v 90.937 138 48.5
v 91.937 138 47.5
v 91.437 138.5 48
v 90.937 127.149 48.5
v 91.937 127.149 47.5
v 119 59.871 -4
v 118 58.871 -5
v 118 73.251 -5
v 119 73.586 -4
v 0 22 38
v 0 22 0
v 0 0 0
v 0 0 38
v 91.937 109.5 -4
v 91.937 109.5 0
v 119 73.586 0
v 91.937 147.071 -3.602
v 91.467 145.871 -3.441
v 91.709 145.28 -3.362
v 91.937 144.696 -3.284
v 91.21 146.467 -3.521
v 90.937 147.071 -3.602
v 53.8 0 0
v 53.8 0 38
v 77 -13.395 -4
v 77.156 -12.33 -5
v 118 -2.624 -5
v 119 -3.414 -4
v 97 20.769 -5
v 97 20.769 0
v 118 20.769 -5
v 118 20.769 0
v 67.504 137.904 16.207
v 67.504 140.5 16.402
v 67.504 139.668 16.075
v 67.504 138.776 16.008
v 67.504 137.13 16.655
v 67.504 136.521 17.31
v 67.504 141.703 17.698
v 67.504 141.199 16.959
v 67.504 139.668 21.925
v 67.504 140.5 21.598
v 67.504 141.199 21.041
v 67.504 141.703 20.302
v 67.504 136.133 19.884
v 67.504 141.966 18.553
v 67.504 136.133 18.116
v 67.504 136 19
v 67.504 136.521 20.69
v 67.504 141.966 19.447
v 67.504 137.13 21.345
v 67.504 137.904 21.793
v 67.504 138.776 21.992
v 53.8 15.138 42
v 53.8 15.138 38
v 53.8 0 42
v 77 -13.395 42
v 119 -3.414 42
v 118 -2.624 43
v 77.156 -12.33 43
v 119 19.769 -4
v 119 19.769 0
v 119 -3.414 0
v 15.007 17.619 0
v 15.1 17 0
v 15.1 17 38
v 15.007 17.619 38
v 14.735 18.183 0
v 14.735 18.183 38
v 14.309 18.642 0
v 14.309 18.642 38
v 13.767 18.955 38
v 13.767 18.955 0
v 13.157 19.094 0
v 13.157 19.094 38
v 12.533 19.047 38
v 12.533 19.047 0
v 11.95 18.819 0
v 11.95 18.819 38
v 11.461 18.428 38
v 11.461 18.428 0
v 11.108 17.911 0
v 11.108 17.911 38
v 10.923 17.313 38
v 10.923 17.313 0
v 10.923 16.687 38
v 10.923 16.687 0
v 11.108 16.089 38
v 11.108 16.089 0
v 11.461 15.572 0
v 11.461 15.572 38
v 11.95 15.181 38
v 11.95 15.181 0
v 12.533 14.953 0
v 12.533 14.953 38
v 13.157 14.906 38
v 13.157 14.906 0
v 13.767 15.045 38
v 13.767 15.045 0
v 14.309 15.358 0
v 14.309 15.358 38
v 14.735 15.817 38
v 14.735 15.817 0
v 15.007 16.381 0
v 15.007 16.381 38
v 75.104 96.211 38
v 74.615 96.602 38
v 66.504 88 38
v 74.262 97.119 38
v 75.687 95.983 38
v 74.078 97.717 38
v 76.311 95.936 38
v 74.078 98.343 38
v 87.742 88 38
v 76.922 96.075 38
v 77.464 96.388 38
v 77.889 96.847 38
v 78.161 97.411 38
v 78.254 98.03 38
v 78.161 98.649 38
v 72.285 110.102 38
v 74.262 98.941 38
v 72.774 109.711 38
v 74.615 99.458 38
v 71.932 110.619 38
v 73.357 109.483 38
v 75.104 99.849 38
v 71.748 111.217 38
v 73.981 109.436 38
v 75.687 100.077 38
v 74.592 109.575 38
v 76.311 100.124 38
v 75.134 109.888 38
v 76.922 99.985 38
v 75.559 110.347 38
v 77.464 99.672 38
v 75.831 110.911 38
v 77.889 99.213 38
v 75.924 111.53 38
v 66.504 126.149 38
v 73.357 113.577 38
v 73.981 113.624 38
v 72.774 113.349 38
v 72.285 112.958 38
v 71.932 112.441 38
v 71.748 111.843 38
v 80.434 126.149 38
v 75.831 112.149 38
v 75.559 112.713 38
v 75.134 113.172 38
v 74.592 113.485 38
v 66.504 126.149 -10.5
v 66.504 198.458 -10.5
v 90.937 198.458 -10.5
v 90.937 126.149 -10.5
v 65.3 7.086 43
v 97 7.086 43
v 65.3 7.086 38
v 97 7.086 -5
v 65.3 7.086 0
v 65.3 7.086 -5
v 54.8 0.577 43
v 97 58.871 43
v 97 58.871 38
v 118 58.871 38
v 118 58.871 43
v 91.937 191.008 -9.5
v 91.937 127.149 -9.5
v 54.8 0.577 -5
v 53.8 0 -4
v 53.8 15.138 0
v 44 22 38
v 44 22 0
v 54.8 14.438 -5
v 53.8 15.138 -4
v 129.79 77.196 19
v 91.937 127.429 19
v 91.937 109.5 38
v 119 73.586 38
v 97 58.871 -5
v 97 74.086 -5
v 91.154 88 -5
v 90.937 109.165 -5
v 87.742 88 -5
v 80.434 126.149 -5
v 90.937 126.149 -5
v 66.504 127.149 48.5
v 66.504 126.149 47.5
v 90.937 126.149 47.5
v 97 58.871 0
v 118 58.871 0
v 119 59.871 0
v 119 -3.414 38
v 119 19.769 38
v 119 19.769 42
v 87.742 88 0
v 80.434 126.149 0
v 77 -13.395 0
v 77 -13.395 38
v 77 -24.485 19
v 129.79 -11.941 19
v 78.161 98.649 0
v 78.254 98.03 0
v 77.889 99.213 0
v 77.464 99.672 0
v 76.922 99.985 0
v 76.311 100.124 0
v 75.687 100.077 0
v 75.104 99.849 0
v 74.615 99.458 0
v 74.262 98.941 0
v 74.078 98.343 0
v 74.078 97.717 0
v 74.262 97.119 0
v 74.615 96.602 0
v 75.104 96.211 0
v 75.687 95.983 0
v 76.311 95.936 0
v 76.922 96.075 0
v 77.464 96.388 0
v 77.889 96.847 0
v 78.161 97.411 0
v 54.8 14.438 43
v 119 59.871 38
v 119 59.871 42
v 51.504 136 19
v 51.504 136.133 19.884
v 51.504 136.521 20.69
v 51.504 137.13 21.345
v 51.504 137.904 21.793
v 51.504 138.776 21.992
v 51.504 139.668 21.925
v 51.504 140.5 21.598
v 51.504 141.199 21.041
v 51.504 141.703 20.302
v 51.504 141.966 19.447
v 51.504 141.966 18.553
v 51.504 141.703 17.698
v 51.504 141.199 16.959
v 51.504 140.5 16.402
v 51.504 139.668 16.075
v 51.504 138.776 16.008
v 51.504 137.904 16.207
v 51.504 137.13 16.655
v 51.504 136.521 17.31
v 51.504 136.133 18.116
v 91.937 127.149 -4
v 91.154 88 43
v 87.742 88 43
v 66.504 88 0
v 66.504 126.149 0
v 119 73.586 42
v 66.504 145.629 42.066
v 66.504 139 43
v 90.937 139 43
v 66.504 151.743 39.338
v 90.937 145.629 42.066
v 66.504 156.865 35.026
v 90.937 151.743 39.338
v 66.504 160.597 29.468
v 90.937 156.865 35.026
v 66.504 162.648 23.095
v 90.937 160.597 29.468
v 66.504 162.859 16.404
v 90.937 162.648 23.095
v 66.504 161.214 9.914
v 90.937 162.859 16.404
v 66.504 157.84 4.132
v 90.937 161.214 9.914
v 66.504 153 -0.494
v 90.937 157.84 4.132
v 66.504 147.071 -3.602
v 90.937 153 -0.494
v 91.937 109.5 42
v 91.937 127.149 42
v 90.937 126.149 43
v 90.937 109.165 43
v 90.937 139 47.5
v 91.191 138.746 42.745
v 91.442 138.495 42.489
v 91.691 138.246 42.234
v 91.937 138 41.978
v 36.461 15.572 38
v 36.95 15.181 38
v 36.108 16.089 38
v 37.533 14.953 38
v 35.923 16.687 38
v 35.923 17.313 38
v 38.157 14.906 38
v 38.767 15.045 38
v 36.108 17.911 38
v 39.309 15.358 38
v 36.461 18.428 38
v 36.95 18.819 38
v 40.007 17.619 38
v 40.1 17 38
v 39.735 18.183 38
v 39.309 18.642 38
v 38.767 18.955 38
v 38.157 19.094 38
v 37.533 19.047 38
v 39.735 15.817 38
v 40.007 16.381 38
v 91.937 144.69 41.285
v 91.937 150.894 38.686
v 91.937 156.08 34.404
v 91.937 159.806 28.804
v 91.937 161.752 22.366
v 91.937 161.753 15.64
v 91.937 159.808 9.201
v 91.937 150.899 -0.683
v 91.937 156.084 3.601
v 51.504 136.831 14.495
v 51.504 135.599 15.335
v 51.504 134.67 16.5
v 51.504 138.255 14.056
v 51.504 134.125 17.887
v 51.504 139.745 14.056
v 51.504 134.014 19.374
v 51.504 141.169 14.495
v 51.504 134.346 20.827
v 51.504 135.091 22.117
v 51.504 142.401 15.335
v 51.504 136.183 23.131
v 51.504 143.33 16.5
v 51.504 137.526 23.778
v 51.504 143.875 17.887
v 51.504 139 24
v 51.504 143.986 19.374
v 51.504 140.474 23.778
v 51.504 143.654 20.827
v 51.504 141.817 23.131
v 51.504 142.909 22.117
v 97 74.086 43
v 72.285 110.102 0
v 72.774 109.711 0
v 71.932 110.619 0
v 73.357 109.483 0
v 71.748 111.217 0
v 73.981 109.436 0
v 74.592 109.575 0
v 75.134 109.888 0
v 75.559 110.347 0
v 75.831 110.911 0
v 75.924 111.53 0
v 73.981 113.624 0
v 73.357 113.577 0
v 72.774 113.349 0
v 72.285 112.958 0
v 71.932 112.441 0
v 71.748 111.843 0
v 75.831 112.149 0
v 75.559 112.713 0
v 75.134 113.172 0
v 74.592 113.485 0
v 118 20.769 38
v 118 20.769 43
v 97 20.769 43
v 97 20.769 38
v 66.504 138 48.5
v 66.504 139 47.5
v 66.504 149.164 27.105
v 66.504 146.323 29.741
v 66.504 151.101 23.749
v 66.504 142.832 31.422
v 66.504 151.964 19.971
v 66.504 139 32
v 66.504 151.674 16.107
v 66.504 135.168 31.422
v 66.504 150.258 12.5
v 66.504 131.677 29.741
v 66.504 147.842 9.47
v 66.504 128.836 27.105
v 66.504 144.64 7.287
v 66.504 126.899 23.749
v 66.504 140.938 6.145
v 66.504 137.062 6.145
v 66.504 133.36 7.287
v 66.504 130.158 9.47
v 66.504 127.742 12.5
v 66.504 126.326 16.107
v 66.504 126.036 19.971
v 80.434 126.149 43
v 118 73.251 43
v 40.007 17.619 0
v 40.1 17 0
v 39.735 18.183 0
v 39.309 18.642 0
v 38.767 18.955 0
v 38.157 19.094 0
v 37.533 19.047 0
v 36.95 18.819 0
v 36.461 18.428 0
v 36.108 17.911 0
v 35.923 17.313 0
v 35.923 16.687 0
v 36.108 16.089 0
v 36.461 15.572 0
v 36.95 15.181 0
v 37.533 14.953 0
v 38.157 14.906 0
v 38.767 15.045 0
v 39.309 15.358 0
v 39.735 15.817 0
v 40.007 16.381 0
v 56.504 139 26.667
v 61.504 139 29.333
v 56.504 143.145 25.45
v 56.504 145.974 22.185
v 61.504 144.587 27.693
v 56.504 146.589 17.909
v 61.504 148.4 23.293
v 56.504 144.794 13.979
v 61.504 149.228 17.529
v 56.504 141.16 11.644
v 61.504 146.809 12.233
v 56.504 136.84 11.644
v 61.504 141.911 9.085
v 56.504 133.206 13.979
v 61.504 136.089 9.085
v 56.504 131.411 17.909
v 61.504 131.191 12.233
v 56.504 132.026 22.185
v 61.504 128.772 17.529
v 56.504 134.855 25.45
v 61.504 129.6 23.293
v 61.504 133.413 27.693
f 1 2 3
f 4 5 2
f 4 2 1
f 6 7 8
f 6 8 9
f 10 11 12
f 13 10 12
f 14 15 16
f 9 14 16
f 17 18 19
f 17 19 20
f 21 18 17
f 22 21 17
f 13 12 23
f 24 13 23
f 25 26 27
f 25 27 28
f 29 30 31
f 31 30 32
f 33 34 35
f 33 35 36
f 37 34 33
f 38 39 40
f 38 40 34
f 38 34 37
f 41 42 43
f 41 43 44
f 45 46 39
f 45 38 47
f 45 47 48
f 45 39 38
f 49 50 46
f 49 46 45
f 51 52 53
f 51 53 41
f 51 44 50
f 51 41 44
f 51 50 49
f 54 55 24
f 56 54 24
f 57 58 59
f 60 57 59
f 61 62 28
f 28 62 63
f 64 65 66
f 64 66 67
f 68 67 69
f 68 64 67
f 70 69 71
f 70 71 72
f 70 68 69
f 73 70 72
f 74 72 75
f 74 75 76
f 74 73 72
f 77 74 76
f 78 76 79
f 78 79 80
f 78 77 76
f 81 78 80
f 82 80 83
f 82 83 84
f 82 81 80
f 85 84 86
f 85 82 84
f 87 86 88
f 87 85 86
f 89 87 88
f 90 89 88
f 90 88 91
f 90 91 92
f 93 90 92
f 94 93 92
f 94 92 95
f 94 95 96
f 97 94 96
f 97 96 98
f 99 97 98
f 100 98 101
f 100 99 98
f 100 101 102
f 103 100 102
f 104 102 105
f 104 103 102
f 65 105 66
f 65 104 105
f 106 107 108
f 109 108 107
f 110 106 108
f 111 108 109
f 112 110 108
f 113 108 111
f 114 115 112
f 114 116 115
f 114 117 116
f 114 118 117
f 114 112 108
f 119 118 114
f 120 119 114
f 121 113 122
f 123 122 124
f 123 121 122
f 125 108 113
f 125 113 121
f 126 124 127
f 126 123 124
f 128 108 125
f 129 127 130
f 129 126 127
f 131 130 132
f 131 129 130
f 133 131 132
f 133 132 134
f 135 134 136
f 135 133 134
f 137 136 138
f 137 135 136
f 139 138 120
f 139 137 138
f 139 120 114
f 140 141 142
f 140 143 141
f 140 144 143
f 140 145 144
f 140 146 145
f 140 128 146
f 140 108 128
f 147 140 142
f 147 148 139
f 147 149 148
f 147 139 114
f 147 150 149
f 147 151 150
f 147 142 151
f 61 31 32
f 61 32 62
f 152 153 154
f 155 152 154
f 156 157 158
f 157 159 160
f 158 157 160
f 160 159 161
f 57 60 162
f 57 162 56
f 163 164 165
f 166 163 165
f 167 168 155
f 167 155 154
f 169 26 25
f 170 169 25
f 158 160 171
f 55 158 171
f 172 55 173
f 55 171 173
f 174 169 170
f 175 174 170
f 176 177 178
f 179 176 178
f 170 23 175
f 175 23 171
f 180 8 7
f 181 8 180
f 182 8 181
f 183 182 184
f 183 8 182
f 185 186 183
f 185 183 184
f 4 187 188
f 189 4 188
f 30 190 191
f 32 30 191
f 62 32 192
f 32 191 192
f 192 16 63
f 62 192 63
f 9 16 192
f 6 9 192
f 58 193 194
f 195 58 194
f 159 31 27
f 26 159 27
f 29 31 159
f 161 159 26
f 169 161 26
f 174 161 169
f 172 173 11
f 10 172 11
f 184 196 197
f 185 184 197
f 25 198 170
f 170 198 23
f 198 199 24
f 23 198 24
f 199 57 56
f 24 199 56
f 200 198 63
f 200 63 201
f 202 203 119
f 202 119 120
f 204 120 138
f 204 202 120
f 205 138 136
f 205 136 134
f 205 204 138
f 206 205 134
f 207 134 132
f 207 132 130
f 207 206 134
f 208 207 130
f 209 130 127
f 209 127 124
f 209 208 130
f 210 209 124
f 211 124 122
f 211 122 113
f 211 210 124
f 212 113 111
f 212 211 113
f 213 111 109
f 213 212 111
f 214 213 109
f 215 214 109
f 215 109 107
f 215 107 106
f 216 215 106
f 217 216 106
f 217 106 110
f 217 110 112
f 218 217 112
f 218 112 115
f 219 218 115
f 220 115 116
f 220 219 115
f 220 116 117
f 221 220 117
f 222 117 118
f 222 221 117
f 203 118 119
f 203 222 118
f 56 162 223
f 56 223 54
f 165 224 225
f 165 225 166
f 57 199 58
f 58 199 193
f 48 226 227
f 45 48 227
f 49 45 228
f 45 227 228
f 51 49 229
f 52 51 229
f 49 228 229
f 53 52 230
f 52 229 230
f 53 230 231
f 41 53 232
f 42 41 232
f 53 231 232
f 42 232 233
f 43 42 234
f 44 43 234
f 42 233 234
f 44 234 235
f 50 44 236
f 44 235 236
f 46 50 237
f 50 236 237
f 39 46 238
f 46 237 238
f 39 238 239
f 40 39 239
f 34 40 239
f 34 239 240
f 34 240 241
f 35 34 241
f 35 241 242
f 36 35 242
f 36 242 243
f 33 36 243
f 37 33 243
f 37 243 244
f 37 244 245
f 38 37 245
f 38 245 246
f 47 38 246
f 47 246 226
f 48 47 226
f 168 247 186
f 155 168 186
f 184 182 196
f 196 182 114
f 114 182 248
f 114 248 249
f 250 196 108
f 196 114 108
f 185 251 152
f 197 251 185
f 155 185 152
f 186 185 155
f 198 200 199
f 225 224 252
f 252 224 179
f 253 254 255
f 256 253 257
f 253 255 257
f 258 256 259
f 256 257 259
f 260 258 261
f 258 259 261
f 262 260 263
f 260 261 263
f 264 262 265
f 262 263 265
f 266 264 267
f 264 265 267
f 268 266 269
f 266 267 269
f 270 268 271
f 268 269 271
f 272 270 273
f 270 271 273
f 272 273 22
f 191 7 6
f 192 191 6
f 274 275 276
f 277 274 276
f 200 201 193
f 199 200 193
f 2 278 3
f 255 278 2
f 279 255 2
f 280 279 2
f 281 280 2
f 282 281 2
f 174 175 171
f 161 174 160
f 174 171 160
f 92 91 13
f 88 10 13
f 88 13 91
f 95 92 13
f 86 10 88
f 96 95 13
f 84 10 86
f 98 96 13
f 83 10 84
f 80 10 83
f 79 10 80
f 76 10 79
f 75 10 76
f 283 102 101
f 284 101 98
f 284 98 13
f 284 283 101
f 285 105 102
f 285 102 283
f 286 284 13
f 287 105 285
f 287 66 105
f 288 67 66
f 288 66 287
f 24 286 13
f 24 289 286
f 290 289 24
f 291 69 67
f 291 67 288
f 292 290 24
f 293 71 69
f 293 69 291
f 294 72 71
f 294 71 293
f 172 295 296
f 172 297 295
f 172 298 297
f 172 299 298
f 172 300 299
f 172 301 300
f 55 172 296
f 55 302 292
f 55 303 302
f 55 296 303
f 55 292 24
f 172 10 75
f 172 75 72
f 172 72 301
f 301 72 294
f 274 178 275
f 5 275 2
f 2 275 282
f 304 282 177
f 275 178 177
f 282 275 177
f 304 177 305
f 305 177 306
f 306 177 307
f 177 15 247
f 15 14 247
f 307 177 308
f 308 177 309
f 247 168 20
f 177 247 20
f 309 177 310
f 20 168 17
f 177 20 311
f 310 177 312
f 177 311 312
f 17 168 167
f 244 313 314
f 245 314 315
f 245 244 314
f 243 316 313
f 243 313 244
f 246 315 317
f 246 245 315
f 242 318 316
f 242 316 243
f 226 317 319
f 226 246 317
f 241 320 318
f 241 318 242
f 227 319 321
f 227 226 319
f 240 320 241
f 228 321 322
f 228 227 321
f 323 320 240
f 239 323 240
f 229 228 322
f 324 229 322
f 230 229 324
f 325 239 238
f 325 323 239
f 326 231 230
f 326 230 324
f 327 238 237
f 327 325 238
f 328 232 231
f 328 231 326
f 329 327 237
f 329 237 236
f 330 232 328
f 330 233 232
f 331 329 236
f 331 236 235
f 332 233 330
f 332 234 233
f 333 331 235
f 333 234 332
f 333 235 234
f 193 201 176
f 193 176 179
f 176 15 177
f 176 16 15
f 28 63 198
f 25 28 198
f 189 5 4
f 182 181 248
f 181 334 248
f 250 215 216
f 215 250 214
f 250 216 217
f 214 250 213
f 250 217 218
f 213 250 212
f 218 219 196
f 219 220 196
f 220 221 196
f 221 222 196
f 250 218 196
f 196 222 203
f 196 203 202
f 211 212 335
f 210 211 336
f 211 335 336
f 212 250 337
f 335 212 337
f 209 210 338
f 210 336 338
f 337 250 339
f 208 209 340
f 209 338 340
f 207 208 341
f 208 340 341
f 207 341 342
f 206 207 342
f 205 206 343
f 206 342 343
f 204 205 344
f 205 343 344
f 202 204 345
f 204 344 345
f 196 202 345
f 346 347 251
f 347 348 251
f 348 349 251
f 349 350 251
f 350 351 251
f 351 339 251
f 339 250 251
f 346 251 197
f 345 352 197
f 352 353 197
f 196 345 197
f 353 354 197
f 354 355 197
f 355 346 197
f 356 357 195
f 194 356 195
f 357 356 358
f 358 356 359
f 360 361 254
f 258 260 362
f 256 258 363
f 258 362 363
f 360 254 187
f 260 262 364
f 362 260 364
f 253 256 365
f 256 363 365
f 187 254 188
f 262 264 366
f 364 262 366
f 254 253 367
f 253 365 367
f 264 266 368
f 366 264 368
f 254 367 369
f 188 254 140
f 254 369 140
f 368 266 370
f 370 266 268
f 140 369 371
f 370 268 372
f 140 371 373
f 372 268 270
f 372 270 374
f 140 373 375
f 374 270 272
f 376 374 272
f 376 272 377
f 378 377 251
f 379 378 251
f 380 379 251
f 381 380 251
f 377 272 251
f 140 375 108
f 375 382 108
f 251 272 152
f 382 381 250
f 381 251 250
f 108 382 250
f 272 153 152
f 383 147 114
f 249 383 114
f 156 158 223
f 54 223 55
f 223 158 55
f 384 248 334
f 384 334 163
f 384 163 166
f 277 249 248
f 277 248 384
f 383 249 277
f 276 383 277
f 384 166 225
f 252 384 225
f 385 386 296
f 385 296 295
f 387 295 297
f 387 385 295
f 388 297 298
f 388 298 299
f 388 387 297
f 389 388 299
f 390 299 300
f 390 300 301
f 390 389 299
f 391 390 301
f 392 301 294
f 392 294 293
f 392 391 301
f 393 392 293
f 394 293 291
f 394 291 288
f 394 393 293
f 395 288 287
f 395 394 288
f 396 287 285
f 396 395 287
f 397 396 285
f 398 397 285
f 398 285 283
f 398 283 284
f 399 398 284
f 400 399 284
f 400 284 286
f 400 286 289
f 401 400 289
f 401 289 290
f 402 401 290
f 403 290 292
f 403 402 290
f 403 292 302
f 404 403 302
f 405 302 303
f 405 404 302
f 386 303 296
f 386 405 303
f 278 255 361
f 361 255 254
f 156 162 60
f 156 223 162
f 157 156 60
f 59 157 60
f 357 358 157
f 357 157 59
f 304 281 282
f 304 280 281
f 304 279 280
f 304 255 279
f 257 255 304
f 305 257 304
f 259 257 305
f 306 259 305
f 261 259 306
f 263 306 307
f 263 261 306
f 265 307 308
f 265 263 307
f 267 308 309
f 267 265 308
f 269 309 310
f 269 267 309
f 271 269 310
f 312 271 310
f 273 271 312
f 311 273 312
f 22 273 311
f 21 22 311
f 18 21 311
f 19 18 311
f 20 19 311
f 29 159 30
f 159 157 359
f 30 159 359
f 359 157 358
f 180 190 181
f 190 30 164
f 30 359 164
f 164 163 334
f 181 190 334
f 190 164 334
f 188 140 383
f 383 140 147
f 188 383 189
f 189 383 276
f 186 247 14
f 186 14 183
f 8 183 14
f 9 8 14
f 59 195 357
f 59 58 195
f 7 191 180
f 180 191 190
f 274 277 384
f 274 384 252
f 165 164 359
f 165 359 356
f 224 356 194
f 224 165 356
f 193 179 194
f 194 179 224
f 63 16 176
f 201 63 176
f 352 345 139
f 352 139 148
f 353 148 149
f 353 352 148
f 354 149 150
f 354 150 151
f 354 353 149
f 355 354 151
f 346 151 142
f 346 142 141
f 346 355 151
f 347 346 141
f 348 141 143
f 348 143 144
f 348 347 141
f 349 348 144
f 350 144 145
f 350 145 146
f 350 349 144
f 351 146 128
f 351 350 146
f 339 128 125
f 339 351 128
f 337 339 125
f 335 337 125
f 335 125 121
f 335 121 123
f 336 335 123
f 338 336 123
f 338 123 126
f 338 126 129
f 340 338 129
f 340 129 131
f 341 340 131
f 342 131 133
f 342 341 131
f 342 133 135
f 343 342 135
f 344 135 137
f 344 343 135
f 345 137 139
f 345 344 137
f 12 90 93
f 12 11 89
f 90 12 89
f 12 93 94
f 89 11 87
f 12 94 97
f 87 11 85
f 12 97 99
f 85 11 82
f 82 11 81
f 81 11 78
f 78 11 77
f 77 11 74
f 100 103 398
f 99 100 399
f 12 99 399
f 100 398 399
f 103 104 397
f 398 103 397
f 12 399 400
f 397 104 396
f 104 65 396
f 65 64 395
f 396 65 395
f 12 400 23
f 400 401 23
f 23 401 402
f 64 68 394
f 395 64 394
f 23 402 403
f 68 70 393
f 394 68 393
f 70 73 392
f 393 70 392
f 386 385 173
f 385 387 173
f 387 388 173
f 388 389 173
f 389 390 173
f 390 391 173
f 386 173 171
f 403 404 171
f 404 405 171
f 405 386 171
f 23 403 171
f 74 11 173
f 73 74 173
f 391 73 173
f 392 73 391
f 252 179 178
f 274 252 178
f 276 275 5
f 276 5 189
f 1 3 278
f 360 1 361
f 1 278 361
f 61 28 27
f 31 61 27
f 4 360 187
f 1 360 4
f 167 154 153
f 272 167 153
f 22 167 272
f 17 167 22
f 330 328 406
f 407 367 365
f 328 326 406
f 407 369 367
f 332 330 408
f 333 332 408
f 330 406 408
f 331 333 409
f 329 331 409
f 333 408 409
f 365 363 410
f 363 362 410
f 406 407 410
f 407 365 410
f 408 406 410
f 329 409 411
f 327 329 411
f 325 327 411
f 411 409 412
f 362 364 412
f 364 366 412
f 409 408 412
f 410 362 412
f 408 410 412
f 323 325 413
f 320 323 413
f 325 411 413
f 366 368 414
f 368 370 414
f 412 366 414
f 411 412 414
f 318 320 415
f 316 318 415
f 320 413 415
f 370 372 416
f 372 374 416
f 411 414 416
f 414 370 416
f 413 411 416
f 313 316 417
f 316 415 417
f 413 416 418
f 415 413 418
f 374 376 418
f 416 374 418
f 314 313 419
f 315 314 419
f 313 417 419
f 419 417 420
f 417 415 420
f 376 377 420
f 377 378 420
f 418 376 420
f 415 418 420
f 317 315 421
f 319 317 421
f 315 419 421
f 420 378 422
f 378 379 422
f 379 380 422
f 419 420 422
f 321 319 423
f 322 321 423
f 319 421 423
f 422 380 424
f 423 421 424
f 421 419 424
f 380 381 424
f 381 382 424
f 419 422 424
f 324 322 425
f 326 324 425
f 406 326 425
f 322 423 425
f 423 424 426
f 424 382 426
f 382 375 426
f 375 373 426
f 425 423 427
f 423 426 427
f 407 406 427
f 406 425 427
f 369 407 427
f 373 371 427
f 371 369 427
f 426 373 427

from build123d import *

# Parameters (mm, degrees)
SKETCH_1_R          = 2.1
EXTRUDE_1_DEPTH     = 38
CUT_EXTRUDE_1_DEPTH = 187.709206858
SKETCH_3_R          = 3
CUT_EXTRUDE_3_DEPTH = 1
EXTRUDE_2_DEPTH     = 5
EXTRUDE_3_DEPTH     = 5
EXTRUDE_2_2_DEPTH   = 25.432180104
EXTRUDE_7_DEPTH     = 25.432180104
SKETCH_18_W         = 25.432180104
SKETCH_18_H         = 5.5
EXTRUDE_8_DEPTH     = 2.30961622
EXTRUDE_10_DEPTH    = 5.5
SKETCH_21_R         = 5
SKETCH_20_R         = 13
CUT_EXTRUDE_4_REACH = 220.784
SKETCH_23_R         = 3
CHAMFER_1_SIZE      = 1


with BuildPart() as part:
    # 草图1 → 凸台-拉伸1 (new body)
    with BuildSketch(Plane.XY):
        Polygon((0, 0), (53.8, 0), (77, -13.394526245), (119, -3.414420564), (119, 73.585579436), (91.936542927, 109.5), (91.936542927, 158), (66.504362823, 158), (66.504362823, 88), (91.154362823, 88), (97, 74.085579436), (97, 7.085579436), (65.3, 7.085579436), (44, 22), (0, 22), align=None)
        with Locations((73.824362823, 111.53)):
            Circle(SKETCH_1_R, mode=Mode.SUBTRACT)
        with Locations((76.154362823, 98.03)):
            Circle(SKETCH_1_R, mode=Mode.SUBTRACT)
        with Locations((13, 17)):
            Circle(SKETCH_1_R, mode=Mode.SUBTRACT)
        with Locations((38, 17)):
            Circle(SKETCH_1_R, mode=Mode.SUBTRACT)
    extrude(amount=EXTRUDE_1_DEPTH)

    # 草图2 → 切除-拉伸1 (cut, through all)
    with BuildSketch(Plane(origin=(91.936542927, 0, 0), x_dir=(0, 0, -1), z_dir=(1, 0, 0))):
        with BuildLine():
            Line((-38, 158), (-38, 139))
            ThreePointArc((-38, 139), (-32.435028843, 152.435028843), (-19, 158))
            Line((-19, 158), (-38, 158))
        make_face()
        with BuildLine():
            Line((0, 158), (-19, 158))
            ThreePointArc((-19, 158), (-5.564971157, 152.435028843), (0, 139))
            Line((0, 139), (0, 158))
        make_face()
    extrude(amount=-CUT_EXTRUDE_1_DEPTH, mode=Mode.SUBTRACT)

    # 草图3 → 切除-拉伸3 (cut)
    with BuildSketch(Plane.ZY.offset(-66.504362823)):
        with Locations(Location((19, 139, 0), (0, 0, 270))):
            Circle(SKETCH_3_R)
    extrude(amount=-CUT_EXTRUDE_3_DEPTH, mode=Mode.SUBTRACT)

    # 扫描3: sweep along a path in 草图13
    with BuildLine(Plane.XY.offset(19)) as sweep_3_path:
        Line((91.936542927, 127.429097123), (129.79, 77.195862934))
        Line((129.79, 77.195862934), (129.79, -11.941020396))
        Line((129.79, -11.941020396), (77, -24.485062752))
    # 草图4 → 扫描3 (sweep)
    with BuildSketch(Plane.ZY.offset(-77)):
        Polygon((38, -13.394526245), (0, -13.394526245), (19, -24.485062752), align=None)
    sweep(path=sweep_3_path.line, transition=Transition.RIGHT)

    # 草图14 → Extrude 2 (add)
    with BuildSketch(Plane.XY.offset(38)):
        Polygon((66.504362823, 139), (66.504362823, 126.148557267), (80.434084519, 126.148557267), (87.742437222, 88), (91.154362823, 88), (97, 74.085579436), (97, 58.870893274), (118.999906629, 58.870893274), (118.999906629, 73.585548195), (91.936542927, 109.499844851), (91.936542927, 139), align=None)
        Polygon((118.999906629, 20.768869661), (97, 20.768869661), (97, 7.085579436), (65.3, 7.085579436), (53.8, 15.137966126), (53.8, 0), (77, -13.394526245), (118.999906629, -3.414439978), align=None)
    extrude(amount=EXTRUDE_2_DEPTH)

    # 草图15 → 凸台-拉伸3 (add)
    with BuildSketch(Plane(origin=(0, 0, 0), x_dir=(-1, 0, 0), z_dir=(0, 0, -1))):
        Polygon((-118.999906629, 73.585548195), (-118.999906629, 58.870893274), (-97, 58.870893274), (-97, 74.085579436), (-91.154362823, 88), (-87.742437222, 88), (-80.434084519, 126.148557267), (-66.504362823, 126.148557267), (-66.504362823, 139), (-91.936542927, 139), (-91.936542927, 109.499844851), align=None)
        Polygon((-77, -13.394526245), (-53.8, 0), (-53.8, 15.137966126), (-65.3, 7.085579436), (-97, 7.085579436), (-97, 20.768869661), (-118.999906629, 20.768869661), (-118.999906629, -3.414442751), align=None)
    extrude(amount=EXTRUDE_3_DEPTH)

    # 草图16 → Extrude 2 2 (add)
    with BuildSketch(Plane(origin=(91.936542927, 0, 0), x_dir=(0, 0, -1), z_dir=(1, 0, 0))):
        with BuildLine():
            ThreePointArc((-43, 139), (-19, 163), (5, 139))
            Line((5, 139), (-5, 139))
            ThreePointArc((-5, 139), (-19, 153), (-33, 139))
            Line((-33, 139), (-43, 139))
        make_face()
    extrude(amount=-EXTRUDE_2_2_DEPTH)

    # 草图17 → 凸台-拉伸7 (add)
    with BuildSketch(Plane(origin=(91.936542927, 0, 0), x_dir=(0, 0, -1), z_dir=(1, 0, 0))):
        with BuildLine():
            Line((5, 139), (5, 128.458173487))
            Line((5, 128.458173487), (10.5, 128.458173487))
            Line((10.5, 128.458173487), (10.5, 198.458173487))
            Line((10.5, 198.458173487), (3.602302269, 147.070683498))
            ThreePointArc((3.602302269, 147.070683498), (4.647994148, 143.095408742), (5, 139))
        make_face()
    extrude(amount=-EXTRUDE_7_DEPTH)

    # 草图18 → 凸台-拉伸8 (add)
    with BuildSketch(Plane.XZ.offset(-128.458173487)):
        with Locations((79.220452875, -7.75)):
            Rectangle(SKETCH_18_W, SKETCH_18_H)
    extrude(amount=EXTRUDE_8_DEPTH)

    # 草图19 → 凸台-拉伸10 (add)
    with BuildSketch(Plane.XY.offset(43)):
        Polygon((66.504362823, 126.148557267), (80.434084519, 126.148557267), (91.936542927, 126.148557267), (91.936542927, 139), (66.504362823, 139), align=None)
    extrude(amount=EXTRUDE_10_DEPTH)

    # 草图21 → 放样1 section 0
    with BuildSketch(Plane.ZY.offset(-51.504362823)):
        with Locations((19, 139)):
            Circle(SKETCH_21_R)
    # 草图20 → 放样1 section 1
    with BuildSketch(Plane.ZY.offset(-66.504362823)):
        with Locations((19, 139)):
            Circle(SKETCH_20_R)
    loft()

    # 草图23 → 切除-拉伸4 (cut, up to next)
    with BuildSketch(Plane.ZY.offset(-51.504362823), mode=Mode.PRIVATE) as cut_extrude_4_sk1:
        with Locations(Location((19, 139, 0), (0, 0, 270))):
            Circle(SKETCH_23_R)
    cut_extrude_4_tool1 = extrude(cut_extrude_4_sk1.sketch, amount=-CUT_EXTRUDE_4_REACH, mode=Mode.PRIVATE) & part.part
    add(cut_extrude_4_tool1.solids().sort_by_distance((51.504363, 139, 19))[0], mode=Mode.SUBTRACT)

    # 倒角1
    chamfer_1_edges = [part.edges().sort_by_distance(p)[0] for p in [
        (79.220452875, 139, 48.5),
    ]]
    chamfer(chamfer_1_edges, length=CHAMFER_1_SIZE)

    # 倒角3
    # the kernel refuses this chamfer: 1 mm, written as the material it takes off along each edge
    with BuildSketch(Plane(origin=(91.26987626, 126.815223933, 47.833333333), x_dir=(-0.7071067811865475, 0, 0.7071067811865475), z_dir=(0.5773502691896258, -0.5773502691896258, 0.5773502691896258))) as chamfer_3_piece_1:
        Polygon((-0.707106781, -0.40824829), (0.707106781, -0.40824829), (0, 0.816496581), align=None)
    extrude(amount=1.270170592, mode=Mode.SUBTRACT)
    with BuildSketch(Plane(origin=(53.8, 17.709649114, 43), x_dir=(0.9996219169112968, 0, 0.027495876610589005), z_dir=(0, -1, 0)), Plane(origin=(53.8, -2.571682988, -5), x_dir=(0.9996219169112968, 0, -0.027495876610586414), z_dir=(0, 1, 0))) as chamfer_3_piece_2:
        with BuildLine():
            Line((1.028673195, 0), (-0.056547155, -1.027117794))
            Line((-0.056547155, -1.027117794), (-0.076539593, -1.026567876))
            ThreePointArc((-0.076539593, -1.026567876), (-0.034129227, -0.51339783), (-0.019992438, 0.000549918))
            Line((-0.019992438, 0.000549918), (0.000549918, 0.019992438))
            ThreePointArc((0.000549918, 0.019992438), (0.514497665, 0.00585565), (1.029223113, 0.019992438))
            Line((1.029223113, 0.019992438), (1.028673195, 0))
        make_face()
    extrude(amount=20.281332101, mode=Mode.SUBTRACT)
    with BuildSketch(Plane(origin=(118.999906629, 20.768869661, 38), x_dir=(-0.9996219169112968, 0.02749587661058574, 0), z_dir=(0, 0, 1)), Plane(origin=(118.999906629, 58.870893274, 38), x_dir=(0.027495876610582105, 0.999621916911297, 0), z_dir=(0, 0, 1)), Plane(origin=(118.999906629, 58.870893274, 0), x_dir=(-0.9996219169112968, -0.027495876610589196, 0), z_dir=(0, 0, -1))) as chamfer_3_piece_3:
        with BuildLine():
            Line((1.028673195, 0), (-0.056547155, 1.027117794))
            Line((-0.056547155, 1.027117794), (-0.076539593, 1.026567876))
            ThreePointArc((-0.076539593, 1.026567876), (-0.034129227, 0.51339783), (-0.019992438, -0.000549918))
            Line((-0.019992438, -0.000549918), (0.000549918, -0.019992438))
            ThreePointArc((0.000549918, -0.019992438), (0.514497665, -0.00585565), (1.029223113, -0.019992438))
            Line((1.029223113, -0.019992438), (1.028673195, 0))
        make_face()
    extrude(amount=7.571682988, mode=Mode.SUBTRACT)
    with BuildSketch(Plane(origin=(51.572857202, 1.285841494, 43), x_dir=(0.4998109584556499, 0.8656979742248793, 0.027495876610589116), z_dir=(0.8660254037844378, -0.5000000000000017, 0)), Plane(origin=(79.227142798, -14.680367739, -5), x_dir=(0.49981095845565, 0.8656979742248795, -0.027495876610586535), z_dir=(-0.8660254037844378, 0.5000000000000017, 0))) as chamfer_3_piece_4:
        with BuildLine():
            Line((1.028673195, 0), (-0.056547155, -1.027117794))
            Line((-0.056547155, -1.027117794), (-0.076539593, -1.026567876))
            ThreePointArc((-0.076539593, -1.026567876), (-0.034129227, -0.51339783), (-0.019992438, 0.000549918))
            Line((-0.019992438, 0.000549918), (0.000549918, 0.019992438))
            ThreePointArc((0.000549918, 0.019992438), (0.514497665, 0.00585565), (1.029223113, 0.019992438))
            Line((1.029223113, 0.019992438), (1.028673195, 0))
        make_face()
    extrude(amount=31.932418466, mode=Mode.SUBTRACT)
    with BuildSketch(Plane(origin=(74.497984058, -13.989059351, 43), x_dir=(0.006356618994580412, -0.0267510116732474, -0.9996219169112968), z_dir=(0.9729099403562855, 0.23118444574825722, 0))) as chamfer_3_piece_5:
        with BuildLine():
            Line((1.028673195, 0), (-0.056547155, 1.027117794))
            Line((-0.056547155, 1.027117794), (-0.076539593, 1.026567876))
            ThreePointArc((-0.076539593, 1.026567876), (-0.034129227, 0.51339783), (-0.019992438, -0.000549918))
            Line((-0.019992438, -0.000549918), (0.000549918, -0.019992438))
            ThreePointArc((0.000549918, -0.019992438), (0.514497665, -0.00585565), (1.029223113, -0.019992438))
            Line((1.029223113, -0.019992438), (1.028673195, 0))
        make_face()
    extrude(amount=48.312733341, mode=Mode.SUBTRACT)
    with BuildSketch(Plane(origin=(118.999906629, -5.986122965, 43), x_dir=(0.027495876610582105, 0, -0.999621916911297), z_dir=(0, 1, 0))) as chamfer_3_piece_6:
        with BuildLine():
            Line((1.028673195, 0), (-0.056547155, 1.027117794))
            Line((-0.056547155, 1.027117794), (-0.076539593, 1.026567876))
            ThreePointArc((-0.076539593, 1.026567876), (-0.034129227, 0.51339783), (-0.019992438, -0.000549918))
            Line((-0.019992438, -0.000549918), (0.000549918, -0.019992438))
            ThreePointArc((0.000549918, -0.019992438), (0.514497665, -0.00585565), (1.029223113, -0.019992438))
            Line((1.029223113, -0.019992438), (1.028673195, 0))
        make_face()
    extrude(amount=29.326675615, mode=Mode.SUBTRACT)
    with BuildSketch(Plane(origin=(118.999906629, 56.299210286, 43), x_dir=(-0.9996219169112968, 0, 0.027495876610589196), z_dir=(0, 1, 0)), Plane(origin=(118.999906629, 76.157231183, -5), x_dir=(-0.9996219169112968, 0, -0.027495876610586605), z_dir=(0, -1, 0))) as chamfer_3_piece_7:
        with BuildLine():
            Line((1.028673195, 0), (-0.056547155, -1.027117794))
            Line((-0.056547155, -1.027117794), (-0.076539593, -1.026567876))
            ThreePointArc((-0.076539593, -1.026567876), (-0.034129227, -0.51339783), (-0.019992438, 0.000549918))
            Line((-0.019992438, 0.000549918), (0.000549918, 0.019992438))
            ThreePointArc((0.000549918, 0.019992438), (0.514497665, 0.00585565), (1.029223113, 0.019992438))
            Line((1.029223113, 0.019992438), (1.028673195, 0))
        make_face()
    extrude(amount=19.858020896, mode=Mode.SUBTRACT)
    with BuildSketch(Plane(origin=(120.547584086, 71.53171084, 43), x_dir=(-0.7983335594669047, -0.6015874870692686, 0.027495876610589096), z_dir=(-0.60181502315205, 0.7986355100472916, 0))) as chamfer_3_piece_8_section:
        with BuildLine():
            Line((1.028673195, 0), (-0.056547155, -1.027117794))
            Line((-0.056547155, -1.027117794), (-0.076539593, -1.026567876))
            ThreePointArc((-0.076539593, -1.026567876), (-0.034129227, -0.51339783), (-0.019992438, 0.000549918))
            Line((-0.019992438, 0.000549918), (0.000549918, 0.019992438))
            ThreePointArc((0.000549918, 0.019992438), (0.514497665, 0.00585565), (1.029223113, 0.019992438))
            Line((1.029223113, 0.019992438), (1.028673195, 0))
        make_face()
    chamfer_3_piece_8 = extrude(amount=50.112937457, mode=Mode.PRIVATE)
    chamfer_3_piece_8 = split(chamfer_3_piece_8, bisect_by=Plane(origin=(91.936542927, 90.144566019, 42.669249939), z_dir=(1, 0, 0)), keep=Keep.TOP, mode=Mode.PRIVATE)
    add(chamfer_3_piece_8, mode=Mode.SUBTRACT)
    with BuildSketch(Plane(origin=(91.936542927, 106.928161863, 43), x_dir=(0.027495876610582105, 0, -0.999621916911297), z_dir=(0, 1, 0))) as chamfer_3_piece_9_section:
        with BuildLine():
            Line((1.028673195, 0), (-0.056547155, 1.027117794))
            Line((-0.056547155, 1.027117794), (-0.076539593, 1.026567876))
            ThreePointArc((-0.076539593, 1.026567876), (-0.034129227, 0.51339783), (-0.019992438, -0.000549918))
            Line((-0.019992438, -0.000549918), (0.000549918, -0.019992438))
            ThreePointArc((0.000549918, -0.019992438), (0.514497665, -0.00585565), (1.029223113, -0.019992438))
            Line((1.029223113, -0.019992438), (1.028673195, 0))
        make_face()
    chamfer_3_piece_9 = extrude(amount=19.220395404, mode=Mode.PRIVATE)
    chamfer_3_piece_9 = split(chamfer_3_piece_9, bisect_by=Plane(origin=(87.71452173, 115.102656217, 42.667427315), z_dir=(0.7986355100472916, 0.60181502315205, 0)), keep=Keep.TOP, mode=Mode.PRIVATE)
    add(chamfer_3_piece_9, mode=Mode.SUBTRACT)
    with BuildSketch(Plane(origin=(90.38886547, 111.553682205, -5), x_dir=(-0.7983335594669051, -0.6015874870692681, -0.027495876610586504), z_dir=(0.6018150231520495, -0.7986355100472919, 0))) as chamfer_3_piece_10_section:
        with BuildLine():
            Line((1.028673195, 0), (-0.056547155, -1.027117794))
            Line((-0.056547155, -1.027117794), (-0.076539593, -1.026567876))
            ThreePointArc((-0.076539593, -1.026567876), (-0.034129227, -0.51339783), (-0.019992438, 0.000549918))
            Line((-0.019992438, 0.000549918), (0.000549918, 0.019992438))
            ThreePointArc((0.000549918, 0.019992438), (0.514497665, 0.00585565), (1.029223113, 0.019992438))
            Line((1.029223113, 0.019992438), (1.028673195, 0))
        make_face()
    chamfer_3_piece_10 = extrude(amount=50.112937457, mode=Mode.PRIVATE)
    chamfer_3_piece_10 = split(chamfer_3_piece_10, bisect_by=Plane(origin=(91.936542927, 90.144566019, -4.669249939), z_dir=(1, 0, 0)), keep=Keep.TOP, mode=Mode.PRIVATE)
    add(chamfer_3_piece_10, mode=Mode.SUBTRACT)
    with BuildSketch(Plane(origin=(118.999906629, 20.768869661, 0), x_dir=(-0.9996219169112968, 0.02749587661058574, 0), z_dir=(0, 0, -1))) as chamfer_3_piece_11:
        with BuildLine():
            Line((1.028673195, 0), (-0.056547155, -1.027117794))
            Line((-0.056547155, -1.027117794), (-0.076539593, -1.026567876))
            ThreePointArc((-0.076539593, -1.026567876), (-0.034129227, -0.51339783), (-0.019992438, 0.000549918))
            Line((-0.019992438, 0.000549918), (0.000549918, 0.019992438))
            ThreePointArc((0.000549918, 0.019992438), (0.514497665, 0.00585565), (1.029223113, 0.019992438))
            Line((1.029223113, 0.019992438), (1.028673195, 0))
        make_face()
    extrude(amount=7.571682988, mode=Mode.SUBTRACT)
    with BuildSketch(Plane(origin=(118.999906629, 23.340552649, -5), x_dir=(0.02749587661058217, 0, 0.9996219169112968), z_dir=(0, -1, 0))) as chamfer_3_piece_12:
        with BuildLine():
            Line((1.028673195, 0), (-0.056547155, 1.027117794))
            Line((-0.056547155, 1.027117794), (-0.076539593, 1.026567876))
            ThreePointArc((-0.076539593, 1.026567876), (-0.034129227, 0.51339783), (-0.019992438, -0.000549918))
            Line((-0.019992438, -0.000549918), (0.000549918, -0.019992438))
            ThreePointArc((0.000549918, -0.019992438), (0.514497665, -0.00585565), (1.029223113, -0.019992438))
            Line((1.029223113, -0.019992438), (1.028673195, 0))
        make_face()
    extrude(amount=29.326678388, mode=Mode.SUBTRACT)
    with BuildSketch(Plane(origin=(121.501922608, -2.819909801, -5), x_dir=(-0.2310969780314448, 0.9725421140054292, -0.027495876610586514), z_dir=(-0.9729099548061726, -0.231184384937762, 0))) as chamfer_3_piece_13:
        with BuildLine():
            Line((1.028673195, 0), (-0.056547155, -1.027117794))
            Line((-0.056547155, -1.027117794), (-0.076539593, -1.026567876))
            ThreePointArc((-0.076539593, -1.026567876), (-0.034129227, -0.51339783), (-0.019992438, 0.000549918))
            Line((-0.019992438, 0.000549918), (0.000549918, 0.019992438))
            ThreePointArc((0.000549918, 0.019992438), (0.514497665, 0.00585565), (1.029223113, 0.019992438))
            Line((1.029223113, 0.019992438), (1.028673195, 0))
        make_face()
    extrude(amount=48.3127327, mode=Mode.SUBTRACT)
    with BuildSketch(Plane(origin=(91.936542927, 139, 19), x_dir=(0, 0, 1), z_dir=(0, -1, 0))) as chamfer_3_piece_14_section:
        with BuildLine():
            Line((22.971715729, -0.028284271), (24.028284271, 1.028284271))
            Line((24.028284271, 1.028284271), (24.048284271, 1.028284271))
            ThreePointArc((24.048284271, 1.028284271), (24.02, 0.514142136), (24.02, 0))
            Line((24.02, 0), (24, -0.02))
            ThreePointArc((24, -0.02), (23.485857864, -0.02), (22.971715729, -0.048284271))
            Line((22.971715729, -0.048284271), (22.971715729, -0.028284271))
        make_face()
    chamfer_3_piece_14 = revolve(axis=Axis((91.936542927, 139, 19), (-1, 0, 0)), revolution_arc=166.496974045, mode=Mode.PRIVATE)
    chamfer_3_piece_14 = split(chamfer_3_piece_14, bisect_by=Plane(origin=(91.460066415, 158.711193826, -5.164797766), z_dir=(0, 0.13303598850024104, 0.9911112075664182)), keep=Keep.TOP, mode=Mode.PRIVATE)
    add(chamfer_3_piece_14, mode=Mode.SUBTRACT)
    with BuildSketch(Plane(origin=(91.936542927, 123.576874279, -10.5), x_dir=(0.0274958766105822, 0, 0.999621916911297), z_dir=(0, 1, 0))) as chamfer_3_piece_15:
        with BuildLine():
            Line((1.028673195, 0), (-0.056547155, -1.027117794))
            Line((-0.056547155, -1.027117794), (-0.076539593, -1.026567876))
            ThreePointArc((-0.076539593, -1.026567876), (-0.034129227, -0.51339783), (-0.019992438, 0.000549918))
            Line((-0.019992438, 0.000549918), (0.000549918, 0.019992438))
            ThreePointArc((0.000549918, 0.019992438), (0.514497665, 0.00585565), (1.029223113, 0.019992438))
            Line((1.029223113, 0.019992438), (1.028673195, 0))
        make_face()
    extrude(amount=77.452982196, mode=Mode.SUBTRACT)
    with BuildSketch(Plane(origin=(91.936542927, 126.148557267, -5), x_dir=(0.02749587661058217, 0, 0.9996219169112968), z_dir=(0, -1, 0))) as chamfer_3_piece_16_section:
        with BuildLine():
            Line((1.028673195, 0), (-0.056547155, 1.027117794))
            Line((-0.056547155, 1.027117794), (-0.076539593, 1.026567876))
            ThreePointArc((-0.076539593, 1.026567876), (-0.034129227, 0.51339783), (-0.019992438, -0.000549918))
            Line((-0.019992438, -0.000549918), (0.000549918, -0.019992438))
            ThreePointArc((0.000549918, -0.019992438), (0.514497665, -0.00585565), (1.029223113, -0.019992438))
            Line((1.029223113, -0.019992438), (1.028673195, 0))
        make_face()
    chamfer_3_piece_16 = extrude(amount=19.220395404, mode=Mode.PRIVATE)
    chamfer_3_piece_16 = split(chamfer_3_piece_16, bisect_by=Plane(origin=(87.71452173, 115.102656217, -4.667427315), z_dir=(0.7986355100472919, 0.6018150231520495, 0)), keep=Keep.TOP, mode=Mode.PRIVATE)
    add(chamfer_3_piece_16, mode=Mode.SUBTRACT)
    with BuildSketch(Plane(origin=(91.936542927, 126.148557267, -13.071682988), x_dir=(0.02749587661058229, 0.9996219169112968, 0), z_dir=(0, 0, 1)), Plane(origin=(91.936542927, 126.148557267, 43), x_dir=(0.02749587661058229, 0.9996219169112968, 0), z_dir=(0, 0, 1))) as chamfer_3_piece_17:
        with BuildLine():
            Line((1.028673195, 0), (-0.056547155, 1.027117794))
            Line((-0.056547155, 1.027117794), (-0.076539593, 1.026567876))
            ThreePointArc((-0.076539593, 1.026567876), (-0.034129227, 0.51339783), (-0.019992438, -0.000549918))
            Line((-0.019992438, -0.000549918), (0.000549918, -0.019992438))
            ThreePointArc((0.000549918, -0.019992438), (0.514497665, -0.00585565), (1.029223113, -0.019992438))
            Line((1.029223113, -0.019992438), (1.028673195, 0))
        make_face()
    extrude(amount=8.071682988, mode=Mode.SUBTRACT)
    with BuildSketch(Plane(origin=(94.508225915, 126.148557267, 48.5), x_dir=(0, 0.9996219169112968, 0.027495876610589196), z_dir=(-1, 0, 0))) as chamfer_3_piece_18:
        with BuildLine():
            Line((1.028673195, 0), (-0.056547155, 1.027117794))
            Line((-0.056547155, 1.027117794), (-0.076539593, 1.026567876))
            ThreePointArc((-0.076539593, 1.026567876), (-0.034129227, 0.51339783), (-0.019992438, -0.000549918))
            Line((-0.019992438, -0.000549918), (0.000549918, -0.019992438))
            ThreePointArc((0.000549918, -0.019992438), (0.514497665, -0.00585565), (1.029223113, -0.019992438))
            Line((1.029223113, -0.019992438), (1.028673195, 0))
        make_face()
    extrude(amount=30.575546079, mode=Mode.SUBTRACT)
    with BuildSketch(Plane(origin=(91.936542927, 123.576874279, 48.5), x_dir=(0.027495876610582105, 0, -0.999621916911297), z_dir=(0, 1, 0))) as chamfer_3_piece_19:
        with BuildLine():
            Line((1.028673195, 0), (-0.056547155, 1.027117794))
            Line((-0.056547155, 1.027117794), (-0.076539593, 1.026567876))
            ThreePointArc((-0.076539593, 1.026567876), (-0.034129227, 0.51339783), (-0.019992438, -0.000549918))
            Line((-0.019992438, -0.000549918), (0.000549918, -0.019992438))
            ThreePointArc((0.000549918, -0.019992438), (0.514497665, -0.00585565), (1.029223113, -0.019992438))
            Line((1.029223113, -0.019992438), (1.028673195, 0))
        make_face()
    extrude(amount=16.994808709, mode=Mode.SUBTRACT)
    with BuildSketch(Plane(origin=(91.936542927, 139, 40.428317012), x_dir=(-0.999621916911297, 0.027495876610582292, 0), z_dir=(0, 0, 1))) as chamfer_3_piece_20_section:
        with BuildLine():
            Line((1.028673195, 0), (-0.056547155, 1.027117794))
            Line((-0.056547155, 1.027117794), (-0.076539593, 1.026567876))
            ThreePointArc((-0.076539593, 1.026567876), (-0.034129227, 0.51339783), (-0.019992438, -0.000549918))
            Line((-0.019992438, -0.000549918), (0.000549918, -0.019992438))
            ThreePointArc((0.000549918, -0.019992438), (0.514497665, -0.00585565), (1.029223113, -0.019992438))
            Line((1.029223113, -0.019992438), (1.028673195, 0))
        make_face()
    chamfer_3_piece_20 = extrude(amount=9.643365976, mode=Mode.PRIVATE)
    chamfer_3_piece_20 = chamfer_3_piece_20 - Plane(origin=(91.606828487, 139, 19), x_dir=(0, 0, 1), z_dir=(1, 0, 0)) * Cylinder(24, 24, mode=Mode.PRIVATE)
    add(chamfer_3_piece_20, mode=Mode.SUBTRACT)
    with BuildSketch(Plane(origin=(91.936542927, 106.928161863, 43), x_dir=(0.027495876610582105, 0, -0.999621916911297), z_dir=(0, 1, 0))) as chamfer_3_piece_21a_section:
        with BuildLine():
            Line((1.028673195, 0), (-0.056547155, 1.027117794))
            Line((-0.056547155, 1.027117794), (-0.076539593, 1.026567876))
            ThreePointArc((-0.076539593, 1.026567876), (-0.034129227, 0.51339783), (-0.019992438, -0.000549918))
            Line((-0.019992438, -0.000549918), (0.000549918, -0.019992438))
            ThreePointArc((0.000549918, -0.019992438), (0.514497665, -0.00585565), (1.029223113, -0.019992438))
            Line((1.029223113, -0.019992438), (1.028673195, 0))
        make_face()
    chamfer_3_piece_21a = extrude(amount=19.220395404, mode=Mode.PRIVATE)
    chamfer_3_piece_21a = split(chamfer_3_piece_21a, bisect_by=Plane(origin=(92.310865996, 109.003101361, 42.685176958), z_dir=(-0.7986355100472916, -0.60181502315205, 0)), keep=Keep.TOP, mode=Mode.PRIVATE)
    with BuildSketch(Plane(origin=(120.547584086, 71.53171084, 43), x_dir=(-0.7983335594669047, -0.6015874870692686, 0.027495876610589096), z_dir=(-0.60181502315205, 0.7986355100472916, 0))) as chamfer_3_piece_21b_section:
        with BuildLine():
            Line((1.028673195, 0), (-0.056547155, -1.027117794))
            Line((-0.056547155, -1.027117794), (-0.076539593, -1.026567876))
            ThreePointArc((-0.076539593, -1.026567876), (-0.034129227, -0.51339783), (-0.019992438, 0.000549918))
            Line((-0.019992438, 0.000549918), (0.000549918, 0.019992438))
            ThreePointArc((0.000549918, 0.019992438), (0.514497665, 0.00585565), (1.029223113, 0.019992438))
            Line((1.029223113, 0.019992438), (1.028673195, 0))
        make_face()
    chamfer_3_piece_21b = extrude(amount=50.112937457, mode=Mode.PRIVATE)
    chamfer_3_piece_21b = split(chamfer_3_piece_21b, bisect_by=Plane(origin=(91.936542927, 110.121835087, 42.685176958), z_dir=(-1, 0, 0)), keep=Keep.TOP, mode=Mode.PRIVATE)
    chamfer_3_piece_21 = chamfer_3_piece_21a & chamfer_3_piece_21b
    add(chamfer_3_piece_21, mode=Mode.SUBTRACT)
    with BuildSketch(Plane(origin=(91.936542927, 126.148557267, 40.428317012), x_dir=(0.02749587661058229, 0.9996219169112968, 0), z_dir=(0, 0, 1))) as chamfer_3_piece_22a_section:
        with BuildLine():
            Line((1.028673195, 0), (-0.056547155, 1.027117794))
            Line((-0.056547155, 1.027117794), (-0.076539593, 1.026567876))
            ThreePointArc((-0.076539593, 1.026567876), (-0.034129227, 0.51339783), (-0.019992438, -0.000549918))
            Line((-0.019992438, -0.000549918), (0.000549918, -0.019992438))
            ThreePointArc((0.000549918, -0.019992438), (0.514497665, -0.00585565), (1.029223113, -0.019992438))
            Line((1.029223113, -0.019992438), (1.028673195, 0))
        make_face()
    chamfer_3_piece_22a = extrude(amount=10.643365976, mode=Mode.PRIVATE)
    chamfer_3_piece_22a = split(chamfer_3_piece_22a, bisect_by=Plane(origin=(91.6067493, 126.478350894, 43), z_dir=(0, 0, -1)), keep=Keep.TOP, mode=Mode.PRIVATE)
    with BuildSketch(Plane(origin=(91.936542927, 106.928161863, 43), x_dir=(0.027495876610582105, 0, -0.999621916911297), z_dir=(0, 1, 0))) as chamfer_3_piece_22b_section:
        with BuildLine():
            Line((1.028673195, 0), (-0.056547155, 1.027117794))
            Line((-0.056547155, 1.027117794), (-0.076539593, 1.026567876))
            ThreePointArc((-0.076539593, 1.026567876), (-0.034129227, 0.51339783), (-0.019992438, -0.000549918))
            Line((-0.019992438, -0.000549918), (0.000549918, -0.019992438))
            ThreePointArc((0.000549918, -0.019992438), (0.514497665, -0.00585565), (1.029223113, -0.019992438))
            Line((1.029223113, -0.019992438), (1.028673195, 0))
        make_face()
    chamfer_3_piece_22b = extrude(amount=21.792078392, mode=Mode.PRIVATE)
    chamfer_3_piece_22b = split(chamfer_3_piece_22b, bisect_by=Plane(origin=(91.6067493, 126.148557267, 42.670206373), z_dir=(0, 1, 0)), keep=Keep.TOP, mode=Mode.PRIVATE)
    chamfer_3_piece_22 = chamfer_3_piece_22a & chamfer_3_piece_22b
    add(chamfer_3_piece_22, mode=Mode.SUBTRACT)
    with BuildSketch(Plane(origin=(91.936542927, 126.148557267, -5), x_dir=(0.02749587661058217, 0, 0.9996219169112968), z_dir=(0, -1, 0))) as chamfer_3_piece_23a_section:
        with BuildLine():
            Line((1.028673195, 0), (-0.056547155, 1.027117794))
            Line((-0.056547155, 1.027117794), (-0.076539593, 1.026567876))
            ThreePointArc((-0.076539593, 1.026567876), (-0.034129227, 0.51339783), (-0.019992438, -0.000549918))
            Line((-0.019992438, -0.000549918), (0.000549918, -0.019992438))
            ThreePointArc((0.000549918, -0.019992438), (0.514497665, -0.00585565), (1.029223113, -0.019992438))
            Line((1.029223113, -0.019992438), (1.028673195, 0))
        make_face()
    chamfer_3_piece_23a = extrude(amount=19.220395404, mode=Mode.PRIVATE)
    chamfer_3_piece_23a = split(chamfer_3_piece_23a, bisect_by=Plane(origin=(92.310865996, 109.003101361, -4.685176958), z_dir=(-0.7986355100472919, -0.6018150231520495, 0)), keep=Keep.TOP, mode=Mode.PRIVATE)
    with BuildSketch(Plane(origin=(90.38886547, 111.553682205, -5), x_dir=(-0.7983335594669051, -0.6015874870692681, -0.027495876610586504), z_dir=(0.6018150231520495, -0.7986355100472919, 0))) as chamfer_3_piece_23b_section:
        with BuildLine():
            Line((1.028673195, 0), (-0.056547155, -1.027117794))
            Line((-0.056547155, -1.027117794), (-0.076539593, -1.026567876))
            ThreePointArc((-0.076539593, -1.026567876), (-0.034129227, -0.51339783), (-0.019992438, 0.000549918))
            Line((-0.019992438, 0.000549918), (0.000549918, 0.019992438))
            ThreePointArc((0.000549918, 0.019992438), (0.514497665, 0.00585565), (1.029223113, 0.019992438))
            Line((1.029223113, 0.019992438), (1.028673195, 0))
        make_face()
    chamfer_3_piece_23b = extrude(amount=50.112937457, mode=Mode.PRIVATE)
    chamfer_3_piece_23b = split(chamfer_3_piece_23b, bisect_by=Plane(origin=(91.936542927, 110.121835087, -4.685176958), z_dir=(-1, 0, 0)), keep=Keep.TOP, mode=Mode.PRIVATE)
    chamfer_3_piece_23 = chamfer_3_piece_23a & chamfer_3_piece_23b
    add(chamfer_3_piece_23, mode=Mode.SUBTRACT)
    with BuildSketch(Plane(origin=(91.936542927, 139, 40.428317012), x_dir=(-0.999621916911297, 0.027495876610582292, 0), z_dir=(0, 0, 1))) as chamfer_3_piece_24a_section:
        with BuildLine():
            Line((1.028673195, 0), (-0.056547155, 1.027117794))
            Line((-0.056547155, 1.027117794), (-0.076539593, 1.026567876))
            ThreePointArc((-0.076539593, 1.026567876), (-0.034129227, 0.51339783), (-0.019992438, -0.000549918))
            Line((-0.019992438, -0.000549918), (0.000549918, -0.019992438))
            ThreePointArc((0.000549918, -0.019992438), (0.514497665, -0.00585565), (1.029223113, -0.019992438))
            Line((1.029223113, -0.019992438), (1.028673195, 0))
        make_face()
    chamfer_3_piece_24a = extrude(amount=9.643365976, mode=Mode.PRIVATE)
    chamfer_3_piece_24a = chamfer_3_piece_24a & Plane(origin=(91.606531136, 139, 19), x_dir=(0, 0, 1), z_dir=(1, 0, 0)) * Cylinder(24, 24, mode=Mode.PRIVATE)
    with BuildSketch(Plane(origin=(91.936542927, 139, 19), x_dir=(0, -0.10708445732496112, 0.9942499278347565), z_dir=(0, -0.9942499278347565, -0.10708445732496112))) as chamfer_3_piece_24b_section:
        with BuildLine():
            Line((22.971715729, -0.028284271), (24.028284271, 1.028284271))
            Line((24.028284271, 1.028284271), (24.048284271, 1.028284271))
            ThreePointArc((24.048284271, 1.028284271), (24.02, 0.514142136), (24.02, 0))
            Line((24.02, 0), (24, -0.02))
            ThreePointArc((24, -0.02), (23.485857864, -0.02), (22.971715729, -0.048284271))
            Line((22.971715729, -0.048284271), (22.971715729, -0.028284271))
        make_face()
    chamfer_3_piece_24b = revolve(axis=Axis((91.936542927, 139, 19), (-1, 0, 0)), revolution_arc=172.644248448, mode=Mode.PRIVATE)
    chamfer_3_piece_24b = split(chamfer_3_piece_24b, bisect_by=Plane(origin=(91.605315127, 139, 42.627498031), z_dir=(0, -1, 0)), keep=Keep.TOP, mode=Mode.PRIVATE)
    chamfer_3_piece_24 = chamfer_3_piece_24a & chamfer_3_piece_24b
    add(chamfer_3_piece_24, mode=Mode.SUBTRACT)
    with BuildSketch(Plane(origin=(91.936542927, 126.148557267, -13.071682988), x_dir=(0.02749587661058229, 0.9996219169112968, 0), z_dir=(0, 0, 1))) as chamfer_3_piece_25a_section:
        with BuildLine():
            Line((1.028673195, 0), (-0.056547155, 1.027117794))
            Line((-0.056547155, 1.027117794), (-0.076539593, 1.026567876))
            ThreePointArc((-0.076539593, 1.026567876), (-0.034129227, 0.51339783), (-0.019992438, -0.000549918))
            Line((-0.019992438, -0.000549918), (0.000549918, -0.019992438))
            ThreePointArc((0.000549918, -0.019992438), (0.514497665, -0.00585565), (1.029223113, -0.019992438))
            Line((1.029223113, -0.019992438), (1.028673195, 0))
        make_face()
    chamfer_3_piece_25a = extrude(amount=10.643365976, mode=Mode.PRIVATE)
    chamfer_3_piece_25a = split(chamfer_3_piece_25a, bisect_by=Plane(origin=(91.6067493, 126.478350893, -5), z_dir=(0, 0, 1)), keep=Keep.TOP, mode=Mode.PRIVATE)
    with BuildSketch(Plane(origin=(91.936542927, 128.720240255, -5), x_dir=(0.02749587661058217, 0, 0.9996219169112968), z_dir=(0, -1, 0))) as chamfer_3_piece_25b_section:
        with BuildLine():
            Line((1.028673195, 0), (-0.056547155, 1.027117794))
            Line((-0.056547155, 1.027117794), (-0.076539593, 1.026567876))
            ThreePointArc((-0.076539593, 1.026567876), (-0.034129227, 0.51339783), (-0.019992438, -0.000549918))
            Line((-0.019992438, -0.000549918), (0.000549918, -0.019992438))
            ThreePointArc((0.000549918, -0.019992438), (0.514497665, -0.00585565), (1.029223113, -0.019992438))
            Line((1.029223113, -0.019992438), (1.028673195, 0))
        make_face()
    chamfer_3_piece_25b = extrude(amount=21.792078392, mode=Mode.PRIVATE)
    chamfer_3_piece_25b = split(chamfer_3_piece_25b, bisect_by=Plane(origin=(91.6067493, 126.148557267, -4.670206373), z_dir=(0, 1, 0)), keep=Keep.TOP, mode=Mode.PRIVATE)
    chamfer_3_piece_25 = chamfer_3_piece_25a & chamfer_3_piece_25b
    add(chamfer_3_piece_25, mode=Mode.SUBTRACT)


solid = part.part
